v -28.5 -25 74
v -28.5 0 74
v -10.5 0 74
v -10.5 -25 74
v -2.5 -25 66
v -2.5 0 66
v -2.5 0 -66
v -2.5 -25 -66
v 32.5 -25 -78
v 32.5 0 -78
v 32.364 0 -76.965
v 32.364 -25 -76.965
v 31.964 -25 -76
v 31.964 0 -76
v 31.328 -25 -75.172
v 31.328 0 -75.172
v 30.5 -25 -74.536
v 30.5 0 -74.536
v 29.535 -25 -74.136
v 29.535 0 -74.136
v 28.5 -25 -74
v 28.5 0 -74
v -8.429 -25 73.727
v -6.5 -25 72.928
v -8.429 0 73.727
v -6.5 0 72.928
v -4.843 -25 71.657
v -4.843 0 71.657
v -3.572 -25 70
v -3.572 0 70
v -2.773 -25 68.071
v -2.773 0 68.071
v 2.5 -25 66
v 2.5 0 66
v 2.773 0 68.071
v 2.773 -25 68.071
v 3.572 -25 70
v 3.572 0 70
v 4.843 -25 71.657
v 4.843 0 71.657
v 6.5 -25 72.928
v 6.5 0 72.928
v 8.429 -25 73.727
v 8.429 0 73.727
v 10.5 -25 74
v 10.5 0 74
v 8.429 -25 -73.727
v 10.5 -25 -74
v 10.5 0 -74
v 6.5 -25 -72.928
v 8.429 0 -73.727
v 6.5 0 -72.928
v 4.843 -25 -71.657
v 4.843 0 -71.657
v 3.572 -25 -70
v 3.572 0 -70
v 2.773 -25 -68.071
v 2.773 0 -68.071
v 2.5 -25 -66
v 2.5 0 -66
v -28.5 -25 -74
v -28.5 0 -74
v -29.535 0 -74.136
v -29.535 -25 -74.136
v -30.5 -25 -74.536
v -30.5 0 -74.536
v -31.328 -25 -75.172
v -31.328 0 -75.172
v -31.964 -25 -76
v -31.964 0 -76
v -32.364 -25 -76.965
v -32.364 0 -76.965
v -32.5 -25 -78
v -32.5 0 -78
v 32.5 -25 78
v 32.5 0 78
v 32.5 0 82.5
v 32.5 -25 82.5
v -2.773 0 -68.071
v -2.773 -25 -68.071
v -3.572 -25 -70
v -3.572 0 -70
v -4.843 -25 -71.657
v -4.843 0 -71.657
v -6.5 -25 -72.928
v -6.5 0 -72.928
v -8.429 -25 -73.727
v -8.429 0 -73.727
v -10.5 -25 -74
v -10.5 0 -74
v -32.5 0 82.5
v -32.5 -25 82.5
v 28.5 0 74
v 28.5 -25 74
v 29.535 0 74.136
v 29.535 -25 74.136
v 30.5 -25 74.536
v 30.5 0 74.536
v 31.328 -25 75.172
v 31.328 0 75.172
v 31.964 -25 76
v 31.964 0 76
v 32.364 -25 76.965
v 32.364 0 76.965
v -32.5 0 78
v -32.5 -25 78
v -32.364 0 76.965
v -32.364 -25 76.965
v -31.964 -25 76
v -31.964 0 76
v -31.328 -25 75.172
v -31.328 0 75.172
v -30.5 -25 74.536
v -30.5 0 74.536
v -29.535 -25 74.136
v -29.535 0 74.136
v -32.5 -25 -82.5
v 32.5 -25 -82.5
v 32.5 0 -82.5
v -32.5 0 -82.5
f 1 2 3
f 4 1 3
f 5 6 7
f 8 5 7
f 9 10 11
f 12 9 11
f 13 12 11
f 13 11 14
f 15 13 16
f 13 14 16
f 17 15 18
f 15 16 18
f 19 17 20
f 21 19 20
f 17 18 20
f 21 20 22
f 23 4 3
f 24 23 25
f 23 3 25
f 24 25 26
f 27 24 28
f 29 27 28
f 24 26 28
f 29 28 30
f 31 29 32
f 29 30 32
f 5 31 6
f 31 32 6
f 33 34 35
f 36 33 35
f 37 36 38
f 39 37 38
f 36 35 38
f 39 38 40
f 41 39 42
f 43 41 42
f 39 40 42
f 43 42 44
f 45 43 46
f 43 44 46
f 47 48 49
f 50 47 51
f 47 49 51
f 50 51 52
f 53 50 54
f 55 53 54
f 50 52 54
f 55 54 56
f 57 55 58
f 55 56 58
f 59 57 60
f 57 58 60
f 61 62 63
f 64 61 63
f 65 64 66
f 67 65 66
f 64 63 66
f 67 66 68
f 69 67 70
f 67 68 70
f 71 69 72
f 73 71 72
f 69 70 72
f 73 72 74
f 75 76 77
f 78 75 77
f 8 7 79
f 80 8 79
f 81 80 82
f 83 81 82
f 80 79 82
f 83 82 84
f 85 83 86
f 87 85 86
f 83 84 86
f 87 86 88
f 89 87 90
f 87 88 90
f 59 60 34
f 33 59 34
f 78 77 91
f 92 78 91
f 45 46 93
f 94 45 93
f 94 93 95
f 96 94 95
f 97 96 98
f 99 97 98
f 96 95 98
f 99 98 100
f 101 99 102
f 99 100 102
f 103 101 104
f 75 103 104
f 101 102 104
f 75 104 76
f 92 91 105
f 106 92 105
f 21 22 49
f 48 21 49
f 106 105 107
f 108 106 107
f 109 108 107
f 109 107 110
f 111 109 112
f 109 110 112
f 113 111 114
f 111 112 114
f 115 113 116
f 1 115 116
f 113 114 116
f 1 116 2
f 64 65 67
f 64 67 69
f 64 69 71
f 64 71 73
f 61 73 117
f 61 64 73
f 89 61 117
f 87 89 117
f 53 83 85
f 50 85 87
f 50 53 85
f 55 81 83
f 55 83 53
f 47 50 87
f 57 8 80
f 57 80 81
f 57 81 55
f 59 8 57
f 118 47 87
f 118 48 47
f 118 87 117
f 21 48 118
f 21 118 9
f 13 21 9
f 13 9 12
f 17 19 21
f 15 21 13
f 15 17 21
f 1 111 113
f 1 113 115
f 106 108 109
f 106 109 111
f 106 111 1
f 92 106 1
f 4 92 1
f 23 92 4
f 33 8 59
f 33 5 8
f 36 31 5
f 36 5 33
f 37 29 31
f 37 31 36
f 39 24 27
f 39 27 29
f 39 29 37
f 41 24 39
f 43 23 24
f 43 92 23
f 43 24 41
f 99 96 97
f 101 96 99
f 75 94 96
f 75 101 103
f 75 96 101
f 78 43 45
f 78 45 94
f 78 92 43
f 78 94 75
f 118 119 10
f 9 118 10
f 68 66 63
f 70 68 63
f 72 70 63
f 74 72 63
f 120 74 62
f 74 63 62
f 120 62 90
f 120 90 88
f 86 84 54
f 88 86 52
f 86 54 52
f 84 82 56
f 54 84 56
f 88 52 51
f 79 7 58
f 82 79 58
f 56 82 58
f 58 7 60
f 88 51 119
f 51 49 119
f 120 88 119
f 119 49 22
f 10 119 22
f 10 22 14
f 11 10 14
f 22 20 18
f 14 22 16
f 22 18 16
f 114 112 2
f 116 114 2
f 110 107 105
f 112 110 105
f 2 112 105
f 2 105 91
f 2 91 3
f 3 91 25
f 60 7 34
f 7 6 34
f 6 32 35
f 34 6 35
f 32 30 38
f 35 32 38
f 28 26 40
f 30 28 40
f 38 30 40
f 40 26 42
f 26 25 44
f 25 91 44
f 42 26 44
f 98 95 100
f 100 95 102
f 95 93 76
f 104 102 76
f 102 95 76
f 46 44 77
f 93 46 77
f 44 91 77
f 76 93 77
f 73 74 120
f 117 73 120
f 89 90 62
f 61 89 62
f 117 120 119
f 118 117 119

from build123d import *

# Parameters (mm, degrees)
F1_DEPTH = 25


with BuildPart() as f1:
    # F0 (on Front) → F1 (new body)
    with BuildSketch(Plane.XZ):
        with BuildLine():
            Line((32.5, 82.5), (-32.5, 82.5))
            Line((-32.5, 82.5), (-32.5, 78))
            ThreePointArc((-32.5, 78), (-31.328427, 75.171573), (-28.5, 74))
            Line((-28.5, 74), (-10.5, 74))
            ThreePointArc((-10.5, 74), (-4.843146, 71.656854), (-2.5, 66))
            Line((-2.5, 66), (-2.5, -66))
            ThreePointArc((-2.5, -66), (-4.843146, -71.656854), (-10.5, -74))
            Line((-10.5, -74), (-28.5, -74))
            ThreePointArc((-28.5, -74), (-31.328427, -75.171573), (-32.5, -78))
            Line((-32.5, -78), (-32.5, -82.5))
            Line((-32.5, -82.5), (32.5, -82.5))
            Line((32.5, -82.5), (32.5, -78))
            ThreePointArc((32.5, -78), (31.328427, -75.171573), (28.5, -74))
            Line((28.5, -74), (10.5, -74))
            ThreePointArc((10.5, -74), (4.843146, -71.656854), (2.5, -66))
            Line((2.5, -66), (2.5, 66))
            ThreePointArc((2.5, 66), (4.843146, 71.656854), (10.5, 74))
            Line((10.5, 74), (28.5, 74))
            ThreePointArc((28.5, 74), (31.328427, 75.171573), (32.5, 78))
            Line((32.5, 78), (32.5, 82.5))
        make_face()
    extrude(amount=F1_DEPTH)


solid = f1.part
